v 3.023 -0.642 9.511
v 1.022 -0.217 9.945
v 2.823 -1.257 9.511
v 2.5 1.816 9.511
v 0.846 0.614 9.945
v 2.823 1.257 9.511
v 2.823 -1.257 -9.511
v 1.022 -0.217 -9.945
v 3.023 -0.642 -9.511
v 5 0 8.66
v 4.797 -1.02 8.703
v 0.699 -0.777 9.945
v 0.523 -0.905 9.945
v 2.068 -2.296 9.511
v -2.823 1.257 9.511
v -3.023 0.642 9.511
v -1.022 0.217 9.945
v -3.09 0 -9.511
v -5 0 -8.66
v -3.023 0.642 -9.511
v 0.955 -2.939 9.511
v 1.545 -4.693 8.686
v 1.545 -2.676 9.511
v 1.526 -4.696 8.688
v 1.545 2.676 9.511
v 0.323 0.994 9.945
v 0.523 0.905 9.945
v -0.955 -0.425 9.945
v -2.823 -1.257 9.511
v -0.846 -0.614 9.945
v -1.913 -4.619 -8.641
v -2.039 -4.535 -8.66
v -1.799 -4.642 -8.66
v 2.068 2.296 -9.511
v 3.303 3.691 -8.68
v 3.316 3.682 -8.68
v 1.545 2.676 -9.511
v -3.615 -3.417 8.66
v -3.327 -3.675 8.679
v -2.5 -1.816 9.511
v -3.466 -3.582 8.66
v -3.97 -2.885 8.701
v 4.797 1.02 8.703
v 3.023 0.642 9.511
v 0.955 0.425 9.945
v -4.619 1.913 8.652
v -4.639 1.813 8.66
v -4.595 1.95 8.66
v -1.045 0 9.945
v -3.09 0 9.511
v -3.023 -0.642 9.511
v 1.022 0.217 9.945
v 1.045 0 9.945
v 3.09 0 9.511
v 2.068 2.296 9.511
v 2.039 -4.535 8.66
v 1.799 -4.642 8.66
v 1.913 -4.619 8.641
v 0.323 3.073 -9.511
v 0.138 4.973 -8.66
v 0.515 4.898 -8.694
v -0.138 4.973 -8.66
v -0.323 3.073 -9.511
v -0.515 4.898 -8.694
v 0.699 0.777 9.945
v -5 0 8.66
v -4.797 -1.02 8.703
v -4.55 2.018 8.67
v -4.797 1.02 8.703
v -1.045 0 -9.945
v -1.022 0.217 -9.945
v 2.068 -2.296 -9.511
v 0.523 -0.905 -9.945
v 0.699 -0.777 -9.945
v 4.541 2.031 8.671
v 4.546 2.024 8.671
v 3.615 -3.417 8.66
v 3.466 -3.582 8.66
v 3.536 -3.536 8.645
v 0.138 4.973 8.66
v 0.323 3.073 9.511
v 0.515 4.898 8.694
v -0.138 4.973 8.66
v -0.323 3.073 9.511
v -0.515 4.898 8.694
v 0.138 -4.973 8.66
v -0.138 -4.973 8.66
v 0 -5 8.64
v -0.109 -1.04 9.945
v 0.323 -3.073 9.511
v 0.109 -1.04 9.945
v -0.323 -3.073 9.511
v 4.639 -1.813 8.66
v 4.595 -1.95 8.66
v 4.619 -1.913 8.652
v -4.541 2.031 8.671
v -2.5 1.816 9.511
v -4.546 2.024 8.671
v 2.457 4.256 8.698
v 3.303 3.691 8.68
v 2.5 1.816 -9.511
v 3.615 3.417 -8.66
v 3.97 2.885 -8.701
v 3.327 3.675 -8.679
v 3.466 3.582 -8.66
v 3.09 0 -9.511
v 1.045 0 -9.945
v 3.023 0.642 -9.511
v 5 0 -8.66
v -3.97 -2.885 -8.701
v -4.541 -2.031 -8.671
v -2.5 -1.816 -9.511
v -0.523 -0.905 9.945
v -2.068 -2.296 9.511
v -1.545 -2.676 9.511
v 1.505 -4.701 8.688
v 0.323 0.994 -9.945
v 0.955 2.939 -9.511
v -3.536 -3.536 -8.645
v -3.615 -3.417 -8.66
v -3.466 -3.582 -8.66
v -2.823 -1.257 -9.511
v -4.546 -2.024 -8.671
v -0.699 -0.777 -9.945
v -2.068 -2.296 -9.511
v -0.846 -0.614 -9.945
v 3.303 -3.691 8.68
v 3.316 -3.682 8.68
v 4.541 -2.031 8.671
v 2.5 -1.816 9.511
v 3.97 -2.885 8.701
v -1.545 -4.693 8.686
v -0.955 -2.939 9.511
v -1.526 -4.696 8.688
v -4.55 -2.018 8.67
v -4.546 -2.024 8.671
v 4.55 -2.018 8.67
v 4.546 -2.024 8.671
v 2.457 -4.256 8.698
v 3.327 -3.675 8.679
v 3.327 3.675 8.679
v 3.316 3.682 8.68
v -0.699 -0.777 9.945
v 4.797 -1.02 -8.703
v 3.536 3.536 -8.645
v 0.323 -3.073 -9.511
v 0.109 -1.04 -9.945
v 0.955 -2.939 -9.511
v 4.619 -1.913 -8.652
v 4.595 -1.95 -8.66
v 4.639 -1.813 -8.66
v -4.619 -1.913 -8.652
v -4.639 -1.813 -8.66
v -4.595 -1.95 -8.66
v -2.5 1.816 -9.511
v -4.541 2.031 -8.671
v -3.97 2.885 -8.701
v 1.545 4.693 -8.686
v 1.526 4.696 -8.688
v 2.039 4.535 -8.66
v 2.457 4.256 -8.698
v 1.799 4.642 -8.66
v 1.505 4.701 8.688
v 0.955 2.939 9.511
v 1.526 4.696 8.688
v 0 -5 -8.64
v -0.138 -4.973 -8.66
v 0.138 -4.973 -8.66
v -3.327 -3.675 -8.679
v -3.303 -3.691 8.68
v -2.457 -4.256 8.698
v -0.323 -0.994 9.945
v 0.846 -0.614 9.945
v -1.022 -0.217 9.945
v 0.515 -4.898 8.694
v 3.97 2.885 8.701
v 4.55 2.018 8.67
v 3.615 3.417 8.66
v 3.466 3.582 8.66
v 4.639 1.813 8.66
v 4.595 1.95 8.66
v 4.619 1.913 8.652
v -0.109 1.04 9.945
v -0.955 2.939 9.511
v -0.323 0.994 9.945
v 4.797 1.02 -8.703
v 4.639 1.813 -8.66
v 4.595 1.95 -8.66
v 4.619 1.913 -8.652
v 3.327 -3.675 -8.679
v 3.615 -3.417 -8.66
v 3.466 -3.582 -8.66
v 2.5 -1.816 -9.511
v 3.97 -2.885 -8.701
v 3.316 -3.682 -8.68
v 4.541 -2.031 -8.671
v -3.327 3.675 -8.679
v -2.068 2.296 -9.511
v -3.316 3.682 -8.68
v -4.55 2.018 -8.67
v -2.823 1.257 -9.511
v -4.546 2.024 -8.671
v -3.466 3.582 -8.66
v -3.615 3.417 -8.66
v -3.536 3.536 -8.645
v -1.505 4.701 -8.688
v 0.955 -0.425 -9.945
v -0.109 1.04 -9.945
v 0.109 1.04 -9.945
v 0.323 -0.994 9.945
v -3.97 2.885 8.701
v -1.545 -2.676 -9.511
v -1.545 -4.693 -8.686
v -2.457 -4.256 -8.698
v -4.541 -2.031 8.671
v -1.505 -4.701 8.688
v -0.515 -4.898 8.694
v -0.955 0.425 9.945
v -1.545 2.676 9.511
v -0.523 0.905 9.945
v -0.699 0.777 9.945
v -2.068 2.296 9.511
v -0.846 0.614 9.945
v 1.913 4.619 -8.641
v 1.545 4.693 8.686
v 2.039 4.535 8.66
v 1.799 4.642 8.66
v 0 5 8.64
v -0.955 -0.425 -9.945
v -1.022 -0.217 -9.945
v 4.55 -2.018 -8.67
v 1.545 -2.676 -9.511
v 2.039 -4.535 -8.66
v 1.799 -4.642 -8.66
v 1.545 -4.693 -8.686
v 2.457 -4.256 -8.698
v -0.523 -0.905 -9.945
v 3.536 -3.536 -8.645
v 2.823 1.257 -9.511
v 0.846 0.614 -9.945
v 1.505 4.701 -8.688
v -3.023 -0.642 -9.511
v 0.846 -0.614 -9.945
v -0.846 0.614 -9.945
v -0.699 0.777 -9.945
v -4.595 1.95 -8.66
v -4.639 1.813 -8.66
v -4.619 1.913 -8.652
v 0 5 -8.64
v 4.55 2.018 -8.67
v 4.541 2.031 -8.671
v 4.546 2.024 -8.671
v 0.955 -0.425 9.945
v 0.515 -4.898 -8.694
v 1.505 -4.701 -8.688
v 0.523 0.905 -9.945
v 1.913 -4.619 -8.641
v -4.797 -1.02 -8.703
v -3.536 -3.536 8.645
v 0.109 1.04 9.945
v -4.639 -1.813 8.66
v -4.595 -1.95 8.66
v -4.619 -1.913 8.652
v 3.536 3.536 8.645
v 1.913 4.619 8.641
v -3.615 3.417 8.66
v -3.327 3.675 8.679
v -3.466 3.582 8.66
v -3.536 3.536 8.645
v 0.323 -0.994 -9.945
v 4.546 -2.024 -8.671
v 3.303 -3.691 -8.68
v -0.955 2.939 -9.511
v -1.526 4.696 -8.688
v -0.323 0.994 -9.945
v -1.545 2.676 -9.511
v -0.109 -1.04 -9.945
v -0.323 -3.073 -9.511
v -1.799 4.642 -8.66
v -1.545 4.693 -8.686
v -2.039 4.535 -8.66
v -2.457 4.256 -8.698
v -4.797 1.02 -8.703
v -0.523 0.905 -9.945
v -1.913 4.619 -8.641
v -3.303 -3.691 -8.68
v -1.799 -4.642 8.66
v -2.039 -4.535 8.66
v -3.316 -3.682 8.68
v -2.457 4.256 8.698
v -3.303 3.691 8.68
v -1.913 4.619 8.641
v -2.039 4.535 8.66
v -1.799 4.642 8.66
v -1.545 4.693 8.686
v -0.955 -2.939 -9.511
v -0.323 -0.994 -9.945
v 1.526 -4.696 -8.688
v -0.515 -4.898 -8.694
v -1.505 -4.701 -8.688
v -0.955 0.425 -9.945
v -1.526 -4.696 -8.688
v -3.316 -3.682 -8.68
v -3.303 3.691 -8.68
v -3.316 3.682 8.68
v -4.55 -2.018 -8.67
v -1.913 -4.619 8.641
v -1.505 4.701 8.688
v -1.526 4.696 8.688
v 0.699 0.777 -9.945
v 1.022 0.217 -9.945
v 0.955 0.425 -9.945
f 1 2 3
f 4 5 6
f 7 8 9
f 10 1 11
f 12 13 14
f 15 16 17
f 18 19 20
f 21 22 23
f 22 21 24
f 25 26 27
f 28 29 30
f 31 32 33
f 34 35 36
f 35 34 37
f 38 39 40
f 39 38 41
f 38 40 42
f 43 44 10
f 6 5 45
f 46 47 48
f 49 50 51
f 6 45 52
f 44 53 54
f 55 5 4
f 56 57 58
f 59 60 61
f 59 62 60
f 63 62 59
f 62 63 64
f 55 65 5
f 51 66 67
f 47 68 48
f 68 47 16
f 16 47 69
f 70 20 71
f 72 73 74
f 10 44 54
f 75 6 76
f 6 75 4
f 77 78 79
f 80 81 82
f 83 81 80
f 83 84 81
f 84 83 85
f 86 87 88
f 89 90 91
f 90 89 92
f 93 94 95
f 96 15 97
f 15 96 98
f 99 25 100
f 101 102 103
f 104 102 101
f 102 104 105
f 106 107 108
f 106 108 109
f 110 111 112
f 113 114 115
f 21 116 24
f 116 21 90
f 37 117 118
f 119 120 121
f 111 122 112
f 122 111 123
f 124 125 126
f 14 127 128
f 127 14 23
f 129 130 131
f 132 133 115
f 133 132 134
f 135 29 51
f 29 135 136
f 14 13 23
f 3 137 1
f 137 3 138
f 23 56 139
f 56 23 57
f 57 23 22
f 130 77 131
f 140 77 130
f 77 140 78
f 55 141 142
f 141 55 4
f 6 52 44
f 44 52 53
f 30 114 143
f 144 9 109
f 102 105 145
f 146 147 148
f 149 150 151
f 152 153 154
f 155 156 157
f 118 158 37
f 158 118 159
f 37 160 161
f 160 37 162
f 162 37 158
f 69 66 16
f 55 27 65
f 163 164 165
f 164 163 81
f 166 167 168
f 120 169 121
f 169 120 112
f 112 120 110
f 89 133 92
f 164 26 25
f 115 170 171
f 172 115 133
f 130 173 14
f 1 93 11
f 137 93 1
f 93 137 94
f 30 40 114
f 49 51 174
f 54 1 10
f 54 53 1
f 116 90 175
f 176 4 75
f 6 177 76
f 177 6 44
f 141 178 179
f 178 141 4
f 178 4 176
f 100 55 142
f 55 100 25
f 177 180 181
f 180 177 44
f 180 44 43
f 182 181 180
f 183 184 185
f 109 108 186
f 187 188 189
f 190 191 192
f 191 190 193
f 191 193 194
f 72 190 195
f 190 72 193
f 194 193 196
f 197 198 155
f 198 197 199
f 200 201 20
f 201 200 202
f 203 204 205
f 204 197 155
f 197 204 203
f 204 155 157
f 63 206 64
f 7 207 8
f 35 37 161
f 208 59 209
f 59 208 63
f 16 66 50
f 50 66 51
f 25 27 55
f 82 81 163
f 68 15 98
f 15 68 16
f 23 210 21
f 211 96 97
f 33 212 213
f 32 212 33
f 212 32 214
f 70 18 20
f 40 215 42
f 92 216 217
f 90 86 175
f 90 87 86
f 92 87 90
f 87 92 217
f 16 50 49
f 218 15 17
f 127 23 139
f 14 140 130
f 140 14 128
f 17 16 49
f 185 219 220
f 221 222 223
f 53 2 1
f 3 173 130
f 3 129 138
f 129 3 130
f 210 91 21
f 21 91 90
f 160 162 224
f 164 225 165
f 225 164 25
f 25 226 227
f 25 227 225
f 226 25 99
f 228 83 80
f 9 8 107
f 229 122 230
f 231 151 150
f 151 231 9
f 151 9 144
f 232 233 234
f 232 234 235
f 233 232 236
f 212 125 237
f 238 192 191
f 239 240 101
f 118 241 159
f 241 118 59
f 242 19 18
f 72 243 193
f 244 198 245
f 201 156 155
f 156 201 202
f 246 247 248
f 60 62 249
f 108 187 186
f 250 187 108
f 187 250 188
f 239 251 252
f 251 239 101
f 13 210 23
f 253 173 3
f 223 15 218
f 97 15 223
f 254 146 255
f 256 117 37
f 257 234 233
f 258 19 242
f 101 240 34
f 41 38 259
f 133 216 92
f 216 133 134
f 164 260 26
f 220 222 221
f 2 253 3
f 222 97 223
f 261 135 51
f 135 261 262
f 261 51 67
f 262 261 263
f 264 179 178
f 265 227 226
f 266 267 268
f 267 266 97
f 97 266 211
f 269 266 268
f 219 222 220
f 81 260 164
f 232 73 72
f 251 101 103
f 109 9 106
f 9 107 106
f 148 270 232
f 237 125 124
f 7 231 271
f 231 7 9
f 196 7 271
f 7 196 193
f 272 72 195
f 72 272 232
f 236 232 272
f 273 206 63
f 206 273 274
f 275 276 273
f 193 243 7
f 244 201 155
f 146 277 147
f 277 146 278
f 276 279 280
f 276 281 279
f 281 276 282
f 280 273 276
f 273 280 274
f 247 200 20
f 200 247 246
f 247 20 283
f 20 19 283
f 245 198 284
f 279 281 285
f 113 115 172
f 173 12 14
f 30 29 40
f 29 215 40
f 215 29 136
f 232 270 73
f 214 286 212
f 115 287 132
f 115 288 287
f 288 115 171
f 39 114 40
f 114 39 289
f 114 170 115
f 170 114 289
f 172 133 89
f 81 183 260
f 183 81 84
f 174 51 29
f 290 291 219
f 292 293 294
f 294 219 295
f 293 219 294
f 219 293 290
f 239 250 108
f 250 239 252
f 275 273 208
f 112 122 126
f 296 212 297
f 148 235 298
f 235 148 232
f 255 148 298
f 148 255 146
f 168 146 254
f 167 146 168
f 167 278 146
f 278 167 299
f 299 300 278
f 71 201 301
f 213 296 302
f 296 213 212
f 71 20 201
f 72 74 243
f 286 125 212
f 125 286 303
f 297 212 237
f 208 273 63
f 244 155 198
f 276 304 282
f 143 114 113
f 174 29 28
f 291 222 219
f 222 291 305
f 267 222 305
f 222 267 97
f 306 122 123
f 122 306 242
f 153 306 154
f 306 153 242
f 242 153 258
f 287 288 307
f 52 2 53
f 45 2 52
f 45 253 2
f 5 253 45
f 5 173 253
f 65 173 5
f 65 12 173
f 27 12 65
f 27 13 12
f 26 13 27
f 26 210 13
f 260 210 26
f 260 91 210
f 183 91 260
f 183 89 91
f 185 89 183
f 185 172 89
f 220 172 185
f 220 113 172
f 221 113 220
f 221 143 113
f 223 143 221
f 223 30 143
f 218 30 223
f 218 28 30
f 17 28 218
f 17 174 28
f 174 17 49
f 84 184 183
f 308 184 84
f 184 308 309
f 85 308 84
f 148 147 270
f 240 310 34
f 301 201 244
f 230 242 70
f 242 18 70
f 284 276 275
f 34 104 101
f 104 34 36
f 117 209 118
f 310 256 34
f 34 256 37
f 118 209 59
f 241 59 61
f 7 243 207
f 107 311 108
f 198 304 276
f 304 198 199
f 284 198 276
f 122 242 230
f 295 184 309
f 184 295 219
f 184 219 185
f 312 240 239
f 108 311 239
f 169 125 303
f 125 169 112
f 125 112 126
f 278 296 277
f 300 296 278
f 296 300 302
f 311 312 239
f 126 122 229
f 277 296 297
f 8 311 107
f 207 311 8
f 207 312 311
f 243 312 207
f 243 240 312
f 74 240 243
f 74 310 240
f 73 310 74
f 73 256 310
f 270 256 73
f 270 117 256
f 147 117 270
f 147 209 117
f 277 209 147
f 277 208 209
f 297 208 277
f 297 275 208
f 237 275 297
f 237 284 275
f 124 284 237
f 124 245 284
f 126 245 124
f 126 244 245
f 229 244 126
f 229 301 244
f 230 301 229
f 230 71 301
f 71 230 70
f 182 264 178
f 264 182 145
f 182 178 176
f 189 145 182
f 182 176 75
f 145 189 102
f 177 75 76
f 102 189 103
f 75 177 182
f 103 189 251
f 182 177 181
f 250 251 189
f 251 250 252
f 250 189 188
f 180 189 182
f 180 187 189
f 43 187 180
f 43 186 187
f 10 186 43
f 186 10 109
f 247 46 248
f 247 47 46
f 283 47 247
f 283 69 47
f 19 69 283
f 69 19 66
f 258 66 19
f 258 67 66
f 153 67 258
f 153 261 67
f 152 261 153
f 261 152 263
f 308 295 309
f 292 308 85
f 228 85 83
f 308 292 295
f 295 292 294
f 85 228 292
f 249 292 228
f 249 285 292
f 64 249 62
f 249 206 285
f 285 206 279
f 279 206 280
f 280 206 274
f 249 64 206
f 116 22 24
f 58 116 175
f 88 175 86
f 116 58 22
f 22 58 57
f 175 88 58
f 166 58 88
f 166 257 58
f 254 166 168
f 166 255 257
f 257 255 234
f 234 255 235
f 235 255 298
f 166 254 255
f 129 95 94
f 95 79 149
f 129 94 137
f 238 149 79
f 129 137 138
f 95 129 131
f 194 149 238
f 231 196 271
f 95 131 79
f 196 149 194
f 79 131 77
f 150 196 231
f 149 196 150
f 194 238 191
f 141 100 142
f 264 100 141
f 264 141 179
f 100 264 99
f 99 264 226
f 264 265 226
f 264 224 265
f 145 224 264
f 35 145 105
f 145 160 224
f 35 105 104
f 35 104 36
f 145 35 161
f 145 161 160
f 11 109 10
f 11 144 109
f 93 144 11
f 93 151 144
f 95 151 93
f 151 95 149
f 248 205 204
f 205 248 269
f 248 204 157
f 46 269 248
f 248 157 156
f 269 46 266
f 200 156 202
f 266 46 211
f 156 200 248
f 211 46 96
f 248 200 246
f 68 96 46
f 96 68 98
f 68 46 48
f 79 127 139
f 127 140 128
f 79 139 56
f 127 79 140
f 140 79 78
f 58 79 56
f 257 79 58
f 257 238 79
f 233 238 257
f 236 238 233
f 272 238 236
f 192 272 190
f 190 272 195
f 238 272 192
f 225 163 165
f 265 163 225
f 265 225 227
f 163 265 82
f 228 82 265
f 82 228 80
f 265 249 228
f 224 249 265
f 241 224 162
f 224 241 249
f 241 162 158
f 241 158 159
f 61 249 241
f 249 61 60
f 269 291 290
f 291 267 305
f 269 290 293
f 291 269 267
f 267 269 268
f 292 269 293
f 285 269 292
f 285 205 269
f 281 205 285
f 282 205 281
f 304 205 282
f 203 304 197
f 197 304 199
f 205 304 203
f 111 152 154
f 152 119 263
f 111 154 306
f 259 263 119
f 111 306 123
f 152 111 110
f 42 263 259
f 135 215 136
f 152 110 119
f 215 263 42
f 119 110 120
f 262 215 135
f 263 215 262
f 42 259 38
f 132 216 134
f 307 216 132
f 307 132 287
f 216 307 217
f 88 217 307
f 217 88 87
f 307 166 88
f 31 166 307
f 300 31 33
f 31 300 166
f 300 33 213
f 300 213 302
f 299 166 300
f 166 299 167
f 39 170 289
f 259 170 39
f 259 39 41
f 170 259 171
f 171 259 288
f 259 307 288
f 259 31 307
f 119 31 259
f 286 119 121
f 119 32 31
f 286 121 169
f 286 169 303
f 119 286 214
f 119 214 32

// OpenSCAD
intersection(){
    sphere(r=10);
    cylinder(r=5, h=30, center=true);
}
